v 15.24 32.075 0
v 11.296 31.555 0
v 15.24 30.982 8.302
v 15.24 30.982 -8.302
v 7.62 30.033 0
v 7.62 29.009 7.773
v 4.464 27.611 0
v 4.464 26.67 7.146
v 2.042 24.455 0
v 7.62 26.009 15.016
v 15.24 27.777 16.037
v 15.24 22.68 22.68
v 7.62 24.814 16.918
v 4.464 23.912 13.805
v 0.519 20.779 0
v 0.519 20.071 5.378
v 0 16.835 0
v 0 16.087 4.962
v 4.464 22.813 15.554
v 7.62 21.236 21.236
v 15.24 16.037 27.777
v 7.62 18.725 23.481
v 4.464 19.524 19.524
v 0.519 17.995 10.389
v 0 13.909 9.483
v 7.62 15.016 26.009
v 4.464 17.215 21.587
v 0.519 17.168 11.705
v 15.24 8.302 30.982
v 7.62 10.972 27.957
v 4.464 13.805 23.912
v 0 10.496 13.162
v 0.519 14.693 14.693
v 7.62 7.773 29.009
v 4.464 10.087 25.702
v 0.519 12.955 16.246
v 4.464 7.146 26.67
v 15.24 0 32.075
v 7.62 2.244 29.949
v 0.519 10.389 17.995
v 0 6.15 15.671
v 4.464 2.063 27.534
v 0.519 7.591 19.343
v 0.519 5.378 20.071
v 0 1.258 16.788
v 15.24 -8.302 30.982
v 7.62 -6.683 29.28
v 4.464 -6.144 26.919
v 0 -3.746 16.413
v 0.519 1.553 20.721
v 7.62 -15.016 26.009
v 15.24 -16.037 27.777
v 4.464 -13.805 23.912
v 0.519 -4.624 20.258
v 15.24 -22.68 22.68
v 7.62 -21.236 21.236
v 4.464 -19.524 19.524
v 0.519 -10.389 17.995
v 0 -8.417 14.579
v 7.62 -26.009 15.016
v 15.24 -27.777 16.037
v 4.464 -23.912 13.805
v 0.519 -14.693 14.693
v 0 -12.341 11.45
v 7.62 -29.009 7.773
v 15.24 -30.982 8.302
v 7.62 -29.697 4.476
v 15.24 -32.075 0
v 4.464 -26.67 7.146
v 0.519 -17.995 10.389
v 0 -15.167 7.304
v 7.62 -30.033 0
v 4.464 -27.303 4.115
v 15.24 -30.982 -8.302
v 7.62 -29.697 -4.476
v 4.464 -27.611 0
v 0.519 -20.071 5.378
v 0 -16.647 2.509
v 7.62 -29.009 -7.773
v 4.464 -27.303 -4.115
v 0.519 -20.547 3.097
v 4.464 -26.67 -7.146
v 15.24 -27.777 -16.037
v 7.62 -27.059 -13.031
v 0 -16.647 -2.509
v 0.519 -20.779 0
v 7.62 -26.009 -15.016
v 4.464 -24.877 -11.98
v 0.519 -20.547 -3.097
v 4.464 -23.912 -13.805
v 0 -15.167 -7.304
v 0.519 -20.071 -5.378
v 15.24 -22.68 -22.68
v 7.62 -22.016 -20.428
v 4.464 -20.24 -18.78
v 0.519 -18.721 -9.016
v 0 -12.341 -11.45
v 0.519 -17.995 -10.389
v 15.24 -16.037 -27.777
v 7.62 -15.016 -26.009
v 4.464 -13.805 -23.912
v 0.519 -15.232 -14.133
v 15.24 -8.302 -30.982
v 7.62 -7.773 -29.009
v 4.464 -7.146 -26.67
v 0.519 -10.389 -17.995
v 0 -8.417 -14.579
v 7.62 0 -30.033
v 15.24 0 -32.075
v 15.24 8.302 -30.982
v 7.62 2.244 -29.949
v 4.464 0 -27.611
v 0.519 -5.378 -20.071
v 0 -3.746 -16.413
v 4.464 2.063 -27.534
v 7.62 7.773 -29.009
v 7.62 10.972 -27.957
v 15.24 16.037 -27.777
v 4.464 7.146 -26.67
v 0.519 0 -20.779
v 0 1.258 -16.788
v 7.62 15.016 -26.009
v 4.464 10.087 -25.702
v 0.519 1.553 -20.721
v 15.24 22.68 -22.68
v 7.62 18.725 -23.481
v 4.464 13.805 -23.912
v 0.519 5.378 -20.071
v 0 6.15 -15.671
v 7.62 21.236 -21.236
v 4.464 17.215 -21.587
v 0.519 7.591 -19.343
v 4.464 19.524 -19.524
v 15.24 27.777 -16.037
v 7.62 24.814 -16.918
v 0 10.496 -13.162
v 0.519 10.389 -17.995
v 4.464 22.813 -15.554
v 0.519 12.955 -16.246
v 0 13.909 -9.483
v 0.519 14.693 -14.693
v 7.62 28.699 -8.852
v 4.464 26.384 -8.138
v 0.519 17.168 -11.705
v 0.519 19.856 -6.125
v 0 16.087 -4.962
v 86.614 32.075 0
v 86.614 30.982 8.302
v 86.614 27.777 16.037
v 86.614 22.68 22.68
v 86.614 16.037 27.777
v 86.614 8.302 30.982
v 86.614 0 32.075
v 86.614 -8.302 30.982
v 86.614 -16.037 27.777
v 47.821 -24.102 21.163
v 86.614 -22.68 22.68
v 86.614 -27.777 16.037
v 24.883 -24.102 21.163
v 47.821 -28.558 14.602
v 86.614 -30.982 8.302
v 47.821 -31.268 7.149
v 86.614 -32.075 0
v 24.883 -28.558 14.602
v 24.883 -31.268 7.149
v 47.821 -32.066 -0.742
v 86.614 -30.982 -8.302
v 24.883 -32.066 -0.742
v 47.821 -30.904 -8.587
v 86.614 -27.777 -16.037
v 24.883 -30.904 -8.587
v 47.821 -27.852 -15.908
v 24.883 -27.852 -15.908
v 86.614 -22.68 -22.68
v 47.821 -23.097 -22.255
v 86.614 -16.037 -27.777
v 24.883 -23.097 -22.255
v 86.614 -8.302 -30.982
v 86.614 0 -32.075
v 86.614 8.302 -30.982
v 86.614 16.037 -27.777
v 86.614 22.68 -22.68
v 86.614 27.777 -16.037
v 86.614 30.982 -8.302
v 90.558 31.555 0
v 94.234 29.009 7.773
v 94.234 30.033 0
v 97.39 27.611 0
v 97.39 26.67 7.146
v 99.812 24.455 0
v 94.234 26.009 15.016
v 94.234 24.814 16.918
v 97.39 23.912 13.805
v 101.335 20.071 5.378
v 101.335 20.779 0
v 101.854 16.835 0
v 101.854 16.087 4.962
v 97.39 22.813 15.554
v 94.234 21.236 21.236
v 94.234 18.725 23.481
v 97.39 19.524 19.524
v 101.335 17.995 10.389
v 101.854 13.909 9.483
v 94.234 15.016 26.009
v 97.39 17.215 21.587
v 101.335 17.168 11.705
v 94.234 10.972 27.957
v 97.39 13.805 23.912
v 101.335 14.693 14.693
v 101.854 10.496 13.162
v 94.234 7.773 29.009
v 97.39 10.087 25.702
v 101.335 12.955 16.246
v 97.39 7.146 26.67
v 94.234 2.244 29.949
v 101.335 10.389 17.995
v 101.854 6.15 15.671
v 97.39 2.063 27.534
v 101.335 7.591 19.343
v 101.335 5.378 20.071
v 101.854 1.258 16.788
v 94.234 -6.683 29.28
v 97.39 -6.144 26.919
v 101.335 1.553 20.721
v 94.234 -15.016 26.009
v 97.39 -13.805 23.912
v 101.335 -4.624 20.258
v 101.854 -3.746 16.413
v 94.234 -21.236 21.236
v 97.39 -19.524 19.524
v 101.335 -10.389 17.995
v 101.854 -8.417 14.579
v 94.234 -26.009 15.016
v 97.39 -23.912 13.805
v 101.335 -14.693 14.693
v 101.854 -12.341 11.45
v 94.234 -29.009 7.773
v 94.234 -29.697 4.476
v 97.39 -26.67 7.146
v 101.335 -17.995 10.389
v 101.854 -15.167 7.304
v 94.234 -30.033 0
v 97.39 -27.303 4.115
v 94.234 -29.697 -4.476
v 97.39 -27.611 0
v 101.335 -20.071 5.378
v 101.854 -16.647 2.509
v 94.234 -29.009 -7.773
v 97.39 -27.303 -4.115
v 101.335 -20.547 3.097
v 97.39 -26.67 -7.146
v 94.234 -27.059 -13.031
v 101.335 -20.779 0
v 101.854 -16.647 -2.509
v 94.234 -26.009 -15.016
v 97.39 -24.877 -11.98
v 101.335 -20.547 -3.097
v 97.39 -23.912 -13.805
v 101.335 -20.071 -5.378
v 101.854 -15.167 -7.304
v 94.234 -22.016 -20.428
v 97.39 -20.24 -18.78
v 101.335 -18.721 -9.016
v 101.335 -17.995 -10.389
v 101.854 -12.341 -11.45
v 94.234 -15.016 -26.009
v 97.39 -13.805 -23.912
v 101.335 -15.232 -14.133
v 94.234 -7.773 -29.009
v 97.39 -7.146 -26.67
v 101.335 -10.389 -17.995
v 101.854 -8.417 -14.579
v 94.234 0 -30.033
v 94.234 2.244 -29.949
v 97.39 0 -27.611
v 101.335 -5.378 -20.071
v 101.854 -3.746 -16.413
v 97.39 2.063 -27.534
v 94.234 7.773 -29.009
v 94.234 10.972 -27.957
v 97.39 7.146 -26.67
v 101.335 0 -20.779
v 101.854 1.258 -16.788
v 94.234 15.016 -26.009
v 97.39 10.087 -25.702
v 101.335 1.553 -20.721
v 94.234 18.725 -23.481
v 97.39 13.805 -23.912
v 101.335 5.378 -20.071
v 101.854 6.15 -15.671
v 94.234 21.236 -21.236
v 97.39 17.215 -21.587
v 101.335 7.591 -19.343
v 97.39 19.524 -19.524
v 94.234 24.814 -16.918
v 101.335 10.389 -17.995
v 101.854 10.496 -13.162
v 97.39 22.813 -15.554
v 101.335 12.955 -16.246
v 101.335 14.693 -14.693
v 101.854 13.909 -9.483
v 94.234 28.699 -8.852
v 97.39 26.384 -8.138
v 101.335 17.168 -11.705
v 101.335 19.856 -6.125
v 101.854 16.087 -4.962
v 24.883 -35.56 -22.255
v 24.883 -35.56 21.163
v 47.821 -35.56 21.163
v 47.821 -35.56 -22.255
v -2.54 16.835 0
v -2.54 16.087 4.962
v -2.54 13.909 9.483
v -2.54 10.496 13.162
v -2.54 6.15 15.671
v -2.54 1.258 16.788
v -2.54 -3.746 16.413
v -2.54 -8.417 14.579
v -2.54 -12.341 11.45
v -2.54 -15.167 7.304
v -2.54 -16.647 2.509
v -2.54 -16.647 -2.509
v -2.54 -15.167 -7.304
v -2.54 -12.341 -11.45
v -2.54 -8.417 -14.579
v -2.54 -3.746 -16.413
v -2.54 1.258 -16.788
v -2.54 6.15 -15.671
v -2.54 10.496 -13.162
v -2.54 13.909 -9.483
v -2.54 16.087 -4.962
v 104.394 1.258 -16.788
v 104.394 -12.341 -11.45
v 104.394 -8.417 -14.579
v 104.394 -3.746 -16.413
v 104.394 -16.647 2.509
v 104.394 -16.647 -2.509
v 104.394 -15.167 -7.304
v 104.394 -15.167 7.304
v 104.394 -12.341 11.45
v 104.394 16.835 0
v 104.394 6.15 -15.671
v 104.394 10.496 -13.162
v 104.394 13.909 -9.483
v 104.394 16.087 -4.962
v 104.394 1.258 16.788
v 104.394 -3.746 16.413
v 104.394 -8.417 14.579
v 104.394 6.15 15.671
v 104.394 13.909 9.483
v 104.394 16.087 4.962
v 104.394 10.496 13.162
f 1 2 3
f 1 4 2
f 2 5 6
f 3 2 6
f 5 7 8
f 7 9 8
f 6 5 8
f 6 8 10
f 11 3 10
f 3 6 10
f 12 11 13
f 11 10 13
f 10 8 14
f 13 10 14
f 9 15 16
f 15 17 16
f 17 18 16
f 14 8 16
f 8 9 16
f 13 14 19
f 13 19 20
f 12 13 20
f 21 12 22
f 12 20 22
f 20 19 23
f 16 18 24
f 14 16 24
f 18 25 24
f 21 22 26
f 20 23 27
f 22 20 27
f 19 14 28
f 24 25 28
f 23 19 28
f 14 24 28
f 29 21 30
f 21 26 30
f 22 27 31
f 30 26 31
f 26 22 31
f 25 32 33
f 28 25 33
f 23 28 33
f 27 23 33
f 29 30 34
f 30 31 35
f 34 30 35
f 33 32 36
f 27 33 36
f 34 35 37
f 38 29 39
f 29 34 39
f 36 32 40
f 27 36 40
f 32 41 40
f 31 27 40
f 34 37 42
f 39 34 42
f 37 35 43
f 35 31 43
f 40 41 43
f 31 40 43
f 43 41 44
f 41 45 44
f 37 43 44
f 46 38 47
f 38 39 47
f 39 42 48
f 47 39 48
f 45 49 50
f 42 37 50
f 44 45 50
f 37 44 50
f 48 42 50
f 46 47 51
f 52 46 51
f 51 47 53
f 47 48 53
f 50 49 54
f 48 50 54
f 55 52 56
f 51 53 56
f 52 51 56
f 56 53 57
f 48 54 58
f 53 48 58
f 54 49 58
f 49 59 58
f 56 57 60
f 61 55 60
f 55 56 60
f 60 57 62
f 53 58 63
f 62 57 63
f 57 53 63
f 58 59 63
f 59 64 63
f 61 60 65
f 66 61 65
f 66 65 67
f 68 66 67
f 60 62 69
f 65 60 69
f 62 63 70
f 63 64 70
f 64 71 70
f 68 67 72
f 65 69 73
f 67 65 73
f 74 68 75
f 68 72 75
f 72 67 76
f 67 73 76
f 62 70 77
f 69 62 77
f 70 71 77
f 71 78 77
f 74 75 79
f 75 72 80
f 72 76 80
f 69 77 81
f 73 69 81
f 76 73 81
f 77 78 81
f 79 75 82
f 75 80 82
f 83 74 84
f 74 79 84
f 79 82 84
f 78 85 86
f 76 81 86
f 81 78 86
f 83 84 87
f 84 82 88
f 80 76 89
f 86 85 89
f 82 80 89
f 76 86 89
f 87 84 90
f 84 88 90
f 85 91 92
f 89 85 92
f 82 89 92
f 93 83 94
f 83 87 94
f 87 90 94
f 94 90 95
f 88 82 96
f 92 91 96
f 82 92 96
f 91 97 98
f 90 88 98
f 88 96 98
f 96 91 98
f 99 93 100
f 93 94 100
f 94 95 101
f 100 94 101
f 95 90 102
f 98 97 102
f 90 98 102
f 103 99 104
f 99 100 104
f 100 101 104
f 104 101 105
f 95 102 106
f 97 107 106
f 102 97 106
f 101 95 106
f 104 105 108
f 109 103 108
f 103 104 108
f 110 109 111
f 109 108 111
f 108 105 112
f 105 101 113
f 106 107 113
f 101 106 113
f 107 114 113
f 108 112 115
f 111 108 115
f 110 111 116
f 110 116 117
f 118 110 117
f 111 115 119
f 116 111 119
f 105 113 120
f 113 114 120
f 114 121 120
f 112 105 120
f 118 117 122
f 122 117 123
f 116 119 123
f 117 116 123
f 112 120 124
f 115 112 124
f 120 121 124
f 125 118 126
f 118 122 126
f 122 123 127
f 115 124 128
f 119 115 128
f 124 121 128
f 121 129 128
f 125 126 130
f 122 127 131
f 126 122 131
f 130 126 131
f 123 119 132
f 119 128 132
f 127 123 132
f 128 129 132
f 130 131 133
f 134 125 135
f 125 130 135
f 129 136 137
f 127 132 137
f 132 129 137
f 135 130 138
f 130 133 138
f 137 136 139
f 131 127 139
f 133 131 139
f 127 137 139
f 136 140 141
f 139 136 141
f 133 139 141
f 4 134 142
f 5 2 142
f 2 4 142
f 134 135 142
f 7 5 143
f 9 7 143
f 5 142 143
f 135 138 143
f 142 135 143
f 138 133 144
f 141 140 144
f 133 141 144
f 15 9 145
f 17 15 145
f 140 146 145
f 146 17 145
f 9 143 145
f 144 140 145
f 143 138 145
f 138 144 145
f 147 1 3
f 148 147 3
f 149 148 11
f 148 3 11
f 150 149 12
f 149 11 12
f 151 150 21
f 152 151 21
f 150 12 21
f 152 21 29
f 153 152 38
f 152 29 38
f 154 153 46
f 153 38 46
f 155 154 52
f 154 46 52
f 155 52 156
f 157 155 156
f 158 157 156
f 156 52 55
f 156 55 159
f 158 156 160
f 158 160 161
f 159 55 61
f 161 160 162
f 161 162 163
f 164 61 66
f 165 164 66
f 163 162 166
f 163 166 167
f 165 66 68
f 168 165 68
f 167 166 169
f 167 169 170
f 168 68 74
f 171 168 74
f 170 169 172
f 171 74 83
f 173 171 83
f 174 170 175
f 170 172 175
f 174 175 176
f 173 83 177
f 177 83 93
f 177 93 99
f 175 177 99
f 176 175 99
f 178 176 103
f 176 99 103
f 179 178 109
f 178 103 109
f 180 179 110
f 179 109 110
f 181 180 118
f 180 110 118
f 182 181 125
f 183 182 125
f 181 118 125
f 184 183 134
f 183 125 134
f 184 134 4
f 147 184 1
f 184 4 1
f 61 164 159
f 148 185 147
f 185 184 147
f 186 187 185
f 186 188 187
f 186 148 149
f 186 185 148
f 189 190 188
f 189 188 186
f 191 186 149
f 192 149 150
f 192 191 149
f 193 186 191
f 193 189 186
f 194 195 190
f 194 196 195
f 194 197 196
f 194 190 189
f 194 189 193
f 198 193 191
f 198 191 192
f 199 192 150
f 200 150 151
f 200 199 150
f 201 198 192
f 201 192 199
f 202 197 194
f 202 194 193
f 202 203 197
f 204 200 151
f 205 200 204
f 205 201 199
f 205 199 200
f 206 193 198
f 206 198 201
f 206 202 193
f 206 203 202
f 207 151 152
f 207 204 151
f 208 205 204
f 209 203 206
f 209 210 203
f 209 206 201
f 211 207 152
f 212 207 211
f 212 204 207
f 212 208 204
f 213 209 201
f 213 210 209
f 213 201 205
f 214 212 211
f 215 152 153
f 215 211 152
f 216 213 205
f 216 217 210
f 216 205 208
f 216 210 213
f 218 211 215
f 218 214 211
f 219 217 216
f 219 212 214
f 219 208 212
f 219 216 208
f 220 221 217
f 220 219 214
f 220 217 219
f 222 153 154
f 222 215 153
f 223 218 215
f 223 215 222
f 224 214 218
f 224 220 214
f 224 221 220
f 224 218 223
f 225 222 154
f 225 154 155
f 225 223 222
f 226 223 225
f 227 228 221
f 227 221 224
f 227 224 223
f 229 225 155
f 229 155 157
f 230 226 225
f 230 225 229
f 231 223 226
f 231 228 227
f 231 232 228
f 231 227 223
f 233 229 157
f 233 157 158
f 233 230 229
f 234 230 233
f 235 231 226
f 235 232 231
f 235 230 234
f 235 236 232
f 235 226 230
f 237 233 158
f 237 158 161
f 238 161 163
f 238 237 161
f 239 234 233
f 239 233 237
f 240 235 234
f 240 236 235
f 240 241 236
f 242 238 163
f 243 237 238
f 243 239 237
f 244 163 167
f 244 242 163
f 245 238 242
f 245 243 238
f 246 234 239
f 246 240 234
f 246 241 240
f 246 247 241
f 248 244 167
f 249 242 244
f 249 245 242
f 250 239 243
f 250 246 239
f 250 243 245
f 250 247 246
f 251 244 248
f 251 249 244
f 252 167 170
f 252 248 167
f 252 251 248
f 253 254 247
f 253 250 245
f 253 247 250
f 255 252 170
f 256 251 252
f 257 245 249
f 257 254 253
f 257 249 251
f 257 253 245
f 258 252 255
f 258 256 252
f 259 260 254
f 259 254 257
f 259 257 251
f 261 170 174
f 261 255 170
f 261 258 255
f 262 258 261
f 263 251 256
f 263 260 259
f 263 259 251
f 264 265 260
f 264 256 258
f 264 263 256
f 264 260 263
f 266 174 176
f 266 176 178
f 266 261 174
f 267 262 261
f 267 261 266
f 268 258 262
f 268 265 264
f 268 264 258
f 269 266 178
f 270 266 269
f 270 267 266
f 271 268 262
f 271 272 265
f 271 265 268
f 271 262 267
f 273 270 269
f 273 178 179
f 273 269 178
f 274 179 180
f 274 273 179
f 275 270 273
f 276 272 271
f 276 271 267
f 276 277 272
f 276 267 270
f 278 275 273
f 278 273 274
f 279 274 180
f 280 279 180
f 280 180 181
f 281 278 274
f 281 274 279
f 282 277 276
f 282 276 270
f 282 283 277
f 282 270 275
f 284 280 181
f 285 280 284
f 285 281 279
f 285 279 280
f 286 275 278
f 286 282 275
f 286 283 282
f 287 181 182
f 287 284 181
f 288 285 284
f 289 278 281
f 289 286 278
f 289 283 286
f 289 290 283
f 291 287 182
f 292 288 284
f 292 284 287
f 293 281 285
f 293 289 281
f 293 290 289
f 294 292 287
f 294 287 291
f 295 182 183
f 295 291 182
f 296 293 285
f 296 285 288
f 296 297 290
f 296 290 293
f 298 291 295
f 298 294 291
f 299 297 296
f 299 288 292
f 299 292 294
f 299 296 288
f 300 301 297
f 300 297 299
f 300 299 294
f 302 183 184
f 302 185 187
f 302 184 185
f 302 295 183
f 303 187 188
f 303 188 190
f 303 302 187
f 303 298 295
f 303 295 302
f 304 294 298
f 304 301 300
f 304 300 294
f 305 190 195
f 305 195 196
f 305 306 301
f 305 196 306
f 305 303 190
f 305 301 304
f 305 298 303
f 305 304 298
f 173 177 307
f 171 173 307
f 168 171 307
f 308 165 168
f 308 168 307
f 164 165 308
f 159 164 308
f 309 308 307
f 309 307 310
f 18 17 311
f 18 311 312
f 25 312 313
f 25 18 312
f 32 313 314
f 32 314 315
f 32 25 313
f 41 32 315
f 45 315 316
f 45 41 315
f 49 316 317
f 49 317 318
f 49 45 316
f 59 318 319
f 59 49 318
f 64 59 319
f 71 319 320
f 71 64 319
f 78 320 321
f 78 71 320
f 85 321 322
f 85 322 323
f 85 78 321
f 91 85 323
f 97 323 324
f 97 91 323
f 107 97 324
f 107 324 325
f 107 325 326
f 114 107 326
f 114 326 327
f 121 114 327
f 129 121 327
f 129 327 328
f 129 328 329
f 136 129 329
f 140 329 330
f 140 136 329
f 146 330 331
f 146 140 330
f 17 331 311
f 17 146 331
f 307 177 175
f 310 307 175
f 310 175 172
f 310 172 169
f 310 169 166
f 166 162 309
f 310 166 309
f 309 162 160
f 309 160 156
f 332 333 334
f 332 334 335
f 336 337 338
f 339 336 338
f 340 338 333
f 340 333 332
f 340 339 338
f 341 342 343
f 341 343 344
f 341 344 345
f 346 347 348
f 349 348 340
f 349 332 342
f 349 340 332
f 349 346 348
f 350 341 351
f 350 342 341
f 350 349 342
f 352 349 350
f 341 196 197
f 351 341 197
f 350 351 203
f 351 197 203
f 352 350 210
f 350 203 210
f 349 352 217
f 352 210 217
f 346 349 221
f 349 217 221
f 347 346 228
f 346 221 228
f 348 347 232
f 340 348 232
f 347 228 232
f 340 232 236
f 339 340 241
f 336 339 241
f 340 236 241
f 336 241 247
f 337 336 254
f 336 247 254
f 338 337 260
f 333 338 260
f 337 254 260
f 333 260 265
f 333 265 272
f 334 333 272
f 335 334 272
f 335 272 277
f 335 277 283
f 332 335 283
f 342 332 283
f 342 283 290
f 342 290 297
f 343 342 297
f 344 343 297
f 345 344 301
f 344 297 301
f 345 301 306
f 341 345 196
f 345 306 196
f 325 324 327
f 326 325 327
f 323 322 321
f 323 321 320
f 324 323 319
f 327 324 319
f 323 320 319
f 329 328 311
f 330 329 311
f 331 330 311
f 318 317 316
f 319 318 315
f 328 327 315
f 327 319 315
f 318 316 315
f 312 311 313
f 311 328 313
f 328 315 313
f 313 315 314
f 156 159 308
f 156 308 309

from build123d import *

# Parameters (mm, degrees)
F0_R     = 32.0745936063
F1_DEPTH = 101.854
F2_R     = 15.24
F3_DEPTH = 2.54
F4_DEPTH = 2.54
F5_W     = 22.9380205274
F5_H     = 43.4183962643
F6_DEPTH = 35.56
F7_DEPTH = 25.4


with BuildPart() as f1:
    # F0 (on Right) → F1 (new body)
    with BuildSketch(Plane.YZ):
        Circle(F0_R)
    extrude(amount=F1_DEPTH)

    # F2
    f2_edges = [f1.edges().sort_by_distance(p)[0] for p in [
        (101.854, -32.074594, 0),
        (50.927, 32.074594, 0),
        (0, -32.074594, 0),
    ]]
    fillet(f2_edges, radius=F2_R)

    # F3 (add): a face of the model
    f3_faces = [f1.faces().sort_by_distance(p)[0] for p in [
        (101.854, 0, 0),
    ]]
    extrude(f3_faces, amount=F3_DEPTH)

    # F4 (add): a face of the model
    f4_faces = [f1.faces().sort_by_distance(p)[0] for p in [
        (0, 0, 0),
    ]]
    extrude(f4_faces, amount=F4_DEPTH)

    # F5 (on Front) → F6 (join)
    with BuildSketch(Plane.XZ):
        with Locations((36.352340132, -0.5461424589)):
            Rectangle(F5_W, F5_H)
    extrude(amount=F6_DEPTH)

    # F7 (add): a face of the model
    f7_faces = [f1.faces().sort_by_distance(p)[0] for p in [
        (104.394, 0, 0),
    ]]
    extrude(f7_faces, amount=-F7_DEPTH)


solid = f1.part
